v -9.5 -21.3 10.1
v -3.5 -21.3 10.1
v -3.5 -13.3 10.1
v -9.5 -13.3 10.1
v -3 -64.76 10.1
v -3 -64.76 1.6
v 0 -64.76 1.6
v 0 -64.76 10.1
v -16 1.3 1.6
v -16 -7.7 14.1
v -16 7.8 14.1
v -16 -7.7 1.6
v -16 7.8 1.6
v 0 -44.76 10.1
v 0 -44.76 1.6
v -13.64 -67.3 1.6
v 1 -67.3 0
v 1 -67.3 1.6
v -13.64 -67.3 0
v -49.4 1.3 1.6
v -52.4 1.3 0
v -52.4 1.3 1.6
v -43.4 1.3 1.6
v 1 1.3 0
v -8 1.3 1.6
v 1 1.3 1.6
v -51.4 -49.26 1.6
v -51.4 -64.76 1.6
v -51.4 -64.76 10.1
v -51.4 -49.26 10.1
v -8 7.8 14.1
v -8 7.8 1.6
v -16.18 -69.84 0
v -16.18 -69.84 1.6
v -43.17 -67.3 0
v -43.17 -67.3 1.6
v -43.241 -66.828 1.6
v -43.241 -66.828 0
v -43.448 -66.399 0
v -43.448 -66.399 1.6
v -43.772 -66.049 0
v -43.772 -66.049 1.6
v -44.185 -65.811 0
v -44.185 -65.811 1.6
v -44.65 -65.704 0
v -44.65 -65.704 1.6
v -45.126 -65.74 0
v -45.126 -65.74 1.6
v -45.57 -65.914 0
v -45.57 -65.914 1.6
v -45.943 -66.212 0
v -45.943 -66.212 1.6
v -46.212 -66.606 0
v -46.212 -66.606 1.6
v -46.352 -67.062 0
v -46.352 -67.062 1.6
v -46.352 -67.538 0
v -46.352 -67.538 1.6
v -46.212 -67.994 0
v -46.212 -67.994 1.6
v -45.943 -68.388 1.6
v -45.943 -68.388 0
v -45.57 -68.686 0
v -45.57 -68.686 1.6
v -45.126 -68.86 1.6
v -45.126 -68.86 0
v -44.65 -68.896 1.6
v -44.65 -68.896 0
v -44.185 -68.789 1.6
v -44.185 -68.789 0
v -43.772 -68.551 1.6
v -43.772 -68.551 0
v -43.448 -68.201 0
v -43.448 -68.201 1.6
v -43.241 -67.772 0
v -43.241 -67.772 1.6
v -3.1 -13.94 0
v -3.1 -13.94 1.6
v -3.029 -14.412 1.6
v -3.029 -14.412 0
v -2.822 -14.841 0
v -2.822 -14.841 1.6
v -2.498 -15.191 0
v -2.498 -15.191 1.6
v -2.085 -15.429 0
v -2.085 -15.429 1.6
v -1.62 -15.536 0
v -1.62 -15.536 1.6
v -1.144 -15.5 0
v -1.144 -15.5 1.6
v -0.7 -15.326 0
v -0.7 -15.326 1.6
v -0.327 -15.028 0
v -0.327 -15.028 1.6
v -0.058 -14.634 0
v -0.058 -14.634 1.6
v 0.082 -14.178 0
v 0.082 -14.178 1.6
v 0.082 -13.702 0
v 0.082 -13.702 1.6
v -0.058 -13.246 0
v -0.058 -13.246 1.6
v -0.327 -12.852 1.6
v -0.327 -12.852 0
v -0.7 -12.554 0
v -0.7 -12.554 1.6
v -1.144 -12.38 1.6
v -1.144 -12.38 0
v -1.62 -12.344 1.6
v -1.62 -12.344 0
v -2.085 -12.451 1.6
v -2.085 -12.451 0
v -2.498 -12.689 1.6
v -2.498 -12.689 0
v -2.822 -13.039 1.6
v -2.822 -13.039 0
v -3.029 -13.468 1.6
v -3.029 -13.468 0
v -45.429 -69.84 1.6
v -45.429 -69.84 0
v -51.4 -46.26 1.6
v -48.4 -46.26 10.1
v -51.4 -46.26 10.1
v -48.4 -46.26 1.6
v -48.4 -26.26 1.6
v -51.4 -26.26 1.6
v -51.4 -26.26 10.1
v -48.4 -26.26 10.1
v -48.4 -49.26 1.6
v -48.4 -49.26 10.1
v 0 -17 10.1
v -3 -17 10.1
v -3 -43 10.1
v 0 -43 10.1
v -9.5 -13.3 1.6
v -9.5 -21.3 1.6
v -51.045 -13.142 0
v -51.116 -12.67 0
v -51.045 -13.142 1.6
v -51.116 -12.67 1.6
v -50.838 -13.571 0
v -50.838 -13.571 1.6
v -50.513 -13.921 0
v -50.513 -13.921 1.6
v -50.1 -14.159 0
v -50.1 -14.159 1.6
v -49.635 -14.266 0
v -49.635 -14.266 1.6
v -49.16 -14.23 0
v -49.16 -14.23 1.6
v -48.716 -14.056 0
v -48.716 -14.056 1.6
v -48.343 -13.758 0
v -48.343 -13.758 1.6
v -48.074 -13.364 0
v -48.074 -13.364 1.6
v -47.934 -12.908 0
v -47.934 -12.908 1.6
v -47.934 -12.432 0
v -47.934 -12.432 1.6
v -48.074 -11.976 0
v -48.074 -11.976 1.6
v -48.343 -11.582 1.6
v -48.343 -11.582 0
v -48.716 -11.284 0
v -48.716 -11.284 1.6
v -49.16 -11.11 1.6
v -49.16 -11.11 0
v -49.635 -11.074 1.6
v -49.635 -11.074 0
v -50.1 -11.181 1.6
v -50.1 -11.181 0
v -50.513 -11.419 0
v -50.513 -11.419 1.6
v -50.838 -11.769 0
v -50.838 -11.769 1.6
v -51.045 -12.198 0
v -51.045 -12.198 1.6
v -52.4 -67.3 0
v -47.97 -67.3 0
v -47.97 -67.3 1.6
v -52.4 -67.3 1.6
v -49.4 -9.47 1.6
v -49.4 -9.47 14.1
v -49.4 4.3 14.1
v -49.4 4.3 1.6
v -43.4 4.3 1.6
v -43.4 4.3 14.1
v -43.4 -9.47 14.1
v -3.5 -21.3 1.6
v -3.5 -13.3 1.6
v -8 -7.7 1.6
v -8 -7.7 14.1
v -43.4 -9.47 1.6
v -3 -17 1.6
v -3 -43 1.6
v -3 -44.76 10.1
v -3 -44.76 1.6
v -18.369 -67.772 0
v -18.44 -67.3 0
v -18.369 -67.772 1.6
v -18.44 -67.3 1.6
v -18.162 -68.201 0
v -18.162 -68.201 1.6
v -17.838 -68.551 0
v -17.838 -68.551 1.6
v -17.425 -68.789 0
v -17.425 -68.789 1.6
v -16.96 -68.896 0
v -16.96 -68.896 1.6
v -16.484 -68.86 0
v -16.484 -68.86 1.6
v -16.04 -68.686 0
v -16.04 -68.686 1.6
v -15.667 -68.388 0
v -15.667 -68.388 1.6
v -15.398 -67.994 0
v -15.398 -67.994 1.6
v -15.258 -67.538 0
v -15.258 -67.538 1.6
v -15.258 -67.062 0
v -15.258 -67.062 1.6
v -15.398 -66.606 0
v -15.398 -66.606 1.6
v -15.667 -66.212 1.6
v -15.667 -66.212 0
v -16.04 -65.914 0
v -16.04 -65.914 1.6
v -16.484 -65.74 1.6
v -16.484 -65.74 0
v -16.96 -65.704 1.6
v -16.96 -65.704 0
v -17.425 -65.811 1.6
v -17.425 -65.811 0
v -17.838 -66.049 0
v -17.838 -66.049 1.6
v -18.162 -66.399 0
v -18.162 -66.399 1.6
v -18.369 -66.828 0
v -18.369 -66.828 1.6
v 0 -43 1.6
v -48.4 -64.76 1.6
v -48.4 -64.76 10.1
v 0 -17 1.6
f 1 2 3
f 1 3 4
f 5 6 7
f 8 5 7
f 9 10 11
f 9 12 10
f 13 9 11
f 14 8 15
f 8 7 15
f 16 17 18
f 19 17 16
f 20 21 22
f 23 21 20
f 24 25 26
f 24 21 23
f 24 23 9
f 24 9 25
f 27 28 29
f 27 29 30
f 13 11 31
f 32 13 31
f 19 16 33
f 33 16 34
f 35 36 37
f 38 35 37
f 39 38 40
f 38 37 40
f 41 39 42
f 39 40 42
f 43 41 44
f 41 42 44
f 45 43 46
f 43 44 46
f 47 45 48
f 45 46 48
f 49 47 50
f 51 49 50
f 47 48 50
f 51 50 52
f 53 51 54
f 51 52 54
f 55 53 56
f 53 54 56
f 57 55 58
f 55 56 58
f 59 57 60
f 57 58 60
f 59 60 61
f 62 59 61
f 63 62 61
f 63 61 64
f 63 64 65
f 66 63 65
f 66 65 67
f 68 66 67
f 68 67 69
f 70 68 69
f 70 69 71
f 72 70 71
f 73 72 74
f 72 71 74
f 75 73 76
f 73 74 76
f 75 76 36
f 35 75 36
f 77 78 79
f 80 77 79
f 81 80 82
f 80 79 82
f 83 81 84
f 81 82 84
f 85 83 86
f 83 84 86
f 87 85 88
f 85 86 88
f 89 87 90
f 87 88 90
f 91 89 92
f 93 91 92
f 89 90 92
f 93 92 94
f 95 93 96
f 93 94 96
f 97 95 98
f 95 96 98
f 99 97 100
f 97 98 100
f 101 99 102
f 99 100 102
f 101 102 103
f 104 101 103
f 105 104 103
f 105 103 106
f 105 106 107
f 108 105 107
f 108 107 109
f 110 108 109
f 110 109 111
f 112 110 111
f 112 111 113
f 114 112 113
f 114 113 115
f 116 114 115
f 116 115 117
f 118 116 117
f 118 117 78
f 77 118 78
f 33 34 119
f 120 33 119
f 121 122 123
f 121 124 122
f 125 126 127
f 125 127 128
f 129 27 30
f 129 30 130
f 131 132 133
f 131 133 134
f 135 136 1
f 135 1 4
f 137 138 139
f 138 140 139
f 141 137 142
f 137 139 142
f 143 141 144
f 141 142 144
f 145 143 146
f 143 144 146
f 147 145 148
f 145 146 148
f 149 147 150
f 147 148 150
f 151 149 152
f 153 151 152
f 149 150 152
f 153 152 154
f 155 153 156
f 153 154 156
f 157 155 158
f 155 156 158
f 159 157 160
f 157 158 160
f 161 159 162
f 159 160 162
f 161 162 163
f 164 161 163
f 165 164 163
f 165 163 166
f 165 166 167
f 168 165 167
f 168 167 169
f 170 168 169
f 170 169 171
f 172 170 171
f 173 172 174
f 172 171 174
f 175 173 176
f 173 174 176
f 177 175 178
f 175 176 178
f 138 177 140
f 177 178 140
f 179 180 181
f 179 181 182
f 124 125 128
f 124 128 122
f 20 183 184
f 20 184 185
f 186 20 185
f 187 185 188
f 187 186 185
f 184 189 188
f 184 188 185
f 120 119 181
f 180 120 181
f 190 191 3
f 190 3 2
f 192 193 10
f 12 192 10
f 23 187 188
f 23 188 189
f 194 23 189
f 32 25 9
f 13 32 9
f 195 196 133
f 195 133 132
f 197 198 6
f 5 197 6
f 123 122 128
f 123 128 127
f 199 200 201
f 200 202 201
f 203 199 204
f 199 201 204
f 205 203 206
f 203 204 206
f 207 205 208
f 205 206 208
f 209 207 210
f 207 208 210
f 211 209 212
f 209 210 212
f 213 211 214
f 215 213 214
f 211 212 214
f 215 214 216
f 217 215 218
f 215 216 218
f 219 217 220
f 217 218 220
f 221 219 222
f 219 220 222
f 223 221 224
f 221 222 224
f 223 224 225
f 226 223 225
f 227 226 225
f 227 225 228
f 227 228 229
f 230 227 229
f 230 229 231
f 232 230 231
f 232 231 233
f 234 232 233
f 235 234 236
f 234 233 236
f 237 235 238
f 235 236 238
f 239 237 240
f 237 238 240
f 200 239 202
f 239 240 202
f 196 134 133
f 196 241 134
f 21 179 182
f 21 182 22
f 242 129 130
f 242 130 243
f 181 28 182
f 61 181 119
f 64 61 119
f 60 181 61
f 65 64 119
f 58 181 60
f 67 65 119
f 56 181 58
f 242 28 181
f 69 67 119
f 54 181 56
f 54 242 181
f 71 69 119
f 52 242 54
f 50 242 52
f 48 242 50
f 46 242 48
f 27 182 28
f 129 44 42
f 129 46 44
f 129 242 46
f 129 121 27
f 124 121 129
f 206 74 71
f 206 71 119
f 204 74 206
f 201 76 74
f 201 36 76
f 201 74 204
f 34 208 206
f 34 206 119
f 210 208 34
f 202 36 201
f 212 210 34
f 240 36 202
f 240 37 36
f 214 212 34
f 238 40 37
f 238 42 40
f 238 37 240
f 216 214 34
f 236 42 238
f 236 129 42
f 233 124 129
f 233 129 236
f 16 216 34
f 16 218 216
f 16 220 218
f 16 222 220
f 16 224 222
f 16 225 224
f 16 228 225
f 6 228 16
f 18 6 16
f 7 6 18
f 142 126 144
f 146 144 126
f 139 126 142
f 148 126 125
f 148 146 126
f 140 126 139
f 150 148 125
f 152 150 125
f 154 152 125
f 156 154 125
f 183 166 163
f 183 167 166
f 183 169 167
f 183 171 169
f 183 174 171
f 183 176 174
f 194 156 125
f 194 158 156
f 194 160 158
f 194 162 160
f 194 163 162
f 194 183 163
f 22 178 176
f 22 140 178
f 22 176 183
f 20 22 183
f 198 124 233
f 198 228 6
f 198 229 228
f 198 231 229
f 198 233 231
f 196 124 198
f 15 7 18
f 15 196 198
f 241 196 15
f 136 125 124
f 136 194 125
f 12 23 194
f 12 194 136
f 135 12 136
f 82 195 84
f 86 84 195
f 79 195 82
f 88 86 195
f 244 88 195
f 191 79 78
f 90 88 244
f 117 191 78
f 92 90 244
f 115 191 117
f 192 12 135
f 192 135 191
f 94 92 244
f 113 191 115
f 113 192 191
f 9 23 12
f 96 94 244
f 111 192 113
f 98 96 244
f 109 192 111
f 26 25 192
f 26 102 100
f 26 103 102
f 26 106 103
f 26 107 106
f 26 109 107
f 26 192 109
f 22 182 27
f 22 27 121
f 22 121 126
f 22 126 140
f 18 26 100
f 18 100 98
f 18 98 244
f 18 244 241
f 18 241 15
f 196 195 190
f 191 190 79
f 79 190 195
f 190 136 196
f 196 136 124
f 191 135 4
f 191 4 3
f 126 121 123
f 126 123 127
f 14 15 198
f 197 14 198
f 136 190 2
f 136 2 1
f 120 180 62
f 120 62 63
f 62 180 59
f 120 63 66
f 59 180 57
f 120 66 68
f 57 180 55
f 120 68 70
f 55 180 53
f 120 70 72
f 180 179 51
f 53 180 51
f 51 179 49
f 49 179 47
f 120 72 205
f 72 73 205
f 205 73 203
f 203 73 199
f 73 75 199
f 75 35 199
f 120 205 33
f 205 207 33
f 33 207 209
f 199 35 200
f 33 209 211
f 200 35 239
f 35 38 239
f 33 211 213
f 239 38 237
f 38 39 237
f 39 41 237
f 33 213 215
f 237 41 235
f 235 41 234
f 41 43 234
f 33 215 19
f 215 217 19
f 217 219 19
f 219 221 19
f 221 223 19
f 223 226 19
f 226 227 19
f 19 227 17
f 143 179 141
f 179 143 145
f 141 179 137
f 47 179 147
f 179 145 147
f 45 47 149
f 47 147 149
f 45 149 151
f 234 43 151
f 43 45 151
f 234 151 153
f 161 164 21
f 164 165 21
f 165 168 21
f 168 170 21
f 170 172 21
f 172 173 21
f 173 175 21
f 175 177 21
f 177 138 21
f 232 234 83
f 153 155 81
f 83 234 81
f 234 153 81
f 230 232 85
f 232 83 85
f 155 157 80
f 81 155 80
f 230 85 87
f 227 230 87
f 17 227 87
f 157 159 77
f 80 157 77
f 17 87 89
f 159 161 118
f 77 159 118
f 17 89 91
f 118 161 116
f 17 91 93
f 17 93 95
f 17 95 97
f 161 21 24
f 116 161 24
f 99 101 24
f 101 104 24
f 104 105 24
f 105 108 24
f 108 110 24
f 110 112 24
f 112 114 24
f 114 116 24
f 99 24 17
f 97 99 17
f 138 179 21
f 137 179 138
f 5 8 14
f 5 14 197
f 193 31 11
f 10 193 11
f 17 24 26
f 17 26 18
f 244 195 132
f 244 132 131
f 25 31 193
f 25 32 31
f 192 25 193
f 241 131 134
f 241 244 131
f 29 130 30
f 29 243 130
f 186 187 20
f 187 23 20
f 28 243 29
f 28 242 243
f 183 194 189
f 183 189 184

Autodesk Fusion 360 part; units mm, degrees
sketch "Sketch1" plane through (0, 0, 0) normal (0, 0, 1) x (1, 0, 0)
  line L0 (-52.4, 1.3) -> (1, 1.3)
  line L1 (1, 1.3) -> (1, -67.3)
  line L2 (1, -67.3) -> (-52.4, -67.3)
  line L3 (-52.4, -67.3) -> (-52.4, 1.3)
  dimension "d1" = 68.6
  dimension "d2" = 53.4
extrude "Extrude1" add sketch "Sketch1" along normal blind 1.6
sketch "Sketch3" plane through (0, 0, 1.6) normal (0, 0, 1) x (-1, 0, 0)
  line L0 (52.4, 67.3) -> (-1, 67.3)
  line L1 (-1, 67.3) -> (-1, -1.3)
  line L2 (-1, -1.3) -> (52.4, -1.3)
  line L3 (52.4, -1.3) -> (52.4, 67.3)
  line L4 (3, 64.76) -> (0, 64.76)
  line L5 (0, 64.76) -> (0, 44.76)
  line L6 (0, 44.76) -> (3, 44.76)
  line L7 (3, 44.76) -> (3, 64.76)
  dimension "d5" = 20
  dimension "d6" = 2.54
  dimension "d7" = 3
  dimension "d34" = 1
extrude "Extrude2" add sketch "Sketch3" along normal blind 8.5 contours L4 L5 L6 L7
sketch "Sketch4" plane through (0, 0, 1.6) normal (0, 0, 1) x (-1, 0, 0)
  line L0 (3, 44.76) -> (0, 44.76)
  line L1 (0, 44.76) -> (0, 64.76)
  line L2 (0, 64.76) -> (3, 64.76)
  line L3 (3, 64.76) -> (3, 44.76)
  line L4 (52.4, 67.3) -> (-1, 67.3)
  line L5 (-1, 67.3) -> (-1, -1.3)
  line L6 (-1, -1.3) -> (52.4, -1.3)
  line L7 (52.4, -1.3) -> (52.4, 67.3)
  line L8 (51.4, 49.26) -> (48.4, 49.26)
  line L9 (48.4, 49.26) -> (48.4, 64.76)
  line L10 (48.4, 64.76) -> (51.4, 64.76)
  line L11 (51.4, 64.76) -> (51.4, 49.26)
  dimension "d10" = 15.5
  dimension "d11" = 2.54
  dimension "d12" = 3
  dimension "d36" = 1
extrude "Extrude3" add sketch "Sketch4" along normal blind 8.5 contours L8 L9 L10 L11
sketch "Sketch5" plane through (0, 0, 1.6) normal (0, 0, 1) x (-1, 0, 0)
  line L0 (51.4, 64.76) -> (51.4, 49.26)
  line L1 (51.4, 49.26) -> (48.4, 49.26)
  line L2 (48.4, 49.26) -> (48.4, 64.76)
  line L3 (48.4, 64.76) -> (51.4, 64.76)
  line L4 (3, 44.76) -> (0, 44.76)
  line L5 (0, 44.76) -> (0, 64.76)
  line L6 (0, 64.76) -> (3, 64.76)
  line L7 (3, 64.76) -> (3, 44.76)
  line L8 (52.4, 67.3) -> (-1, 67.3)
  line L9 (-1, 67.3) -> (-1, -1.3)
  line L10 (-1, -1.3) -> (52.4, -1.3)
  line L11 (52.4, -1.3) -> (52.4, 67.3)
  line L12 (51.4, 26.26) -> (48.4, 26.26)
  line L13 (48.4, 26.26) -> (48.4, 46.26)
  line L14 (48.4, 46.26) -> (51.4, 46.26)
  line L15 (51.4, 46.26) -> (51.4, 26.26)
  dimension "d15" = 20
  dimension "d16" = 3
  dimension "d17" = 3
  dimension "d35" = 1
extrude "Extrude4" add sketch "Sketch5" along normal blind 8.5 contours L12 L13 L14 L15
sketch "Sketch6" plane through (0, 0, 1.6) normal (0, 0, 1) x (-1, 0, 0)
  line L0 (51.4, 46.26) -> (51.4, 26.26)
  line L1 (51.4, 26.26) -> (48.4, 26.26)
  line L2 (48.4, 26.26) -> (48.4, 46.26)
  line L3 (48.4, 46.26) -> (51.4, 46.26)
  line L4 (51.4, 64.76) -> (51.4, 49.26)
  line L5 (51.4, 49.26) -> (48.4, 49.26)
  line L6 (48.4, 49.26) -> (48.4, 64.76)
  line L7 (48.4, 64.76) -> (51.4, 64.76)
  line L8 (3, 44.76) -> (0, 44.76)
  line L9 (0, 44.76) -> (0, 64.76)
  line L10 (0, 64.76) -> (3, 64.76)
  line L11 (3, 64.76) -> (3, 44.76)
  line L12 (52.4, 67.3) -> (-1, 67.3)
  line L13 (-1, 67.3) -> (-1, -1.3)
  line L14 (-1, -1.3) -> (52.4, -1.3)
  line L15 (52.4, -1.3) -> (52.4, 67.3)
  line L16 (9.5, 13.3) -> (3.5, 13.3)
  line L17 (3.5, 13.3) -> (3.5, 21.3)
  line L18 (3.5, 21.3) -> (9.5, 21.3)
  line L19 (9.5, 21.3) -> (9.5, 13.3)
  dimension "d20" = 8
  dimension "d21" = 6
  dimension "d22" = 46
  dimension "d23" = 0.5
extrude "Extrude5" add sketch "Sketch6" along normal blind 8.5 contours L16 L17 L18 L19
sketch "Sketch7" plane through (0, 0, 1.6) normal (0, 0, 1) x (-1, 0, 0)
  line L0 (9.5, 21.3) -> (9.5, 13.3)
  line L1 (9.5, 13.3) -> (3.5, 13.3)
  line L2 (3.5, 13.3) -> (3.5, 21.3)
  line L3 (3.5, 21.3) -> (9.5, 21.3)
  line L4 (51.4, 46.26) -> (51.4, 26.26)
  line L5 (51.4, 26.26) -> (48.4, 26.26)
  line L6 (48.4, 26.26) -> (48.4, 46.26)
  line L7 (48.4, 46.26) -> (51.4, 46.26)
  line L8 (51.4, 64.76) -> (51.4, 49.26)
  line L9 (51.4, 49.26) -> (48.4, 49.26)
  line L10 (48.4, 49.26) -> (48.4, 64.76)
  line L11 (48.4, 64.76) -> (51.4, 64.76)
  line L12 (3, 44.76) -> (0, 44.76)
  line L13 (0, 44.76) -> (0, 64.76)
  line L14 (0, 64.76) -> (3, 64.76)
  line L15 (3, 64.76) -> (3, 44.76)
  line L16 (52.4, 67.3) -> (-1, 67.3)
  line L17 (-1, 67.3) -> (-1, -1.3)
  line L18 (-1, -1.3) -> (52.4, -1.3)
  line L19 (52.4, -1.3) -> (52.4, 67.3)
  circle A0 centre (1.5, 13.94) radius 1.6
  dimension "d26" = 3.2
  dimension "d27" = 15.24
  dimension "d28" = 2.5
sketch "Sketch8" plane through (0, 0, 10.1) normal (0, 0, 1) x (-1, 0, 0)
  line L0 (3, 44.76) -> (3, 64.76)
  line L1 (3, 64.76) -> (0, 64.76)
  line L2 (0, 64.76) -> (0, 44.76)
  line L3 (0, 44.76) -> (3, 44.76)
sketch "Sketch9" plane through (0, 0, 1.6) normal (0, 0, 1) x (1, 0, 0)
  line L0 (0, -43) -> (-3, -43)
  line L1 (-3, -43) -> (-3, -17)
  line L2 (-3, -17) -> (0, -17)
  line L3 (0, -17) -> (0, -43)
  line L4 (1, -67.3) -> (1, 1.3)
  dimension "d29" = 26
  dimension "d30" = 3
  dimension "d31" = 1
extrude "Extrude6" add sketch "Sketch9" along normal blind 8.5
extrude "Extrude7" cut sketch "Sketch7" against normal blind 50 contours A0
sketch "Sketch10" plane through (0, 0, 1.6) normal (0, 0, 1) x (-1, 0, 0)
  circle A0 centre (1.5, 13.94) radius 1.6
  line L0 (0, 17) -> (0, 43)
  line L1 (0, 43) -> (3, 43)
  line L2 (3, 43) -> (3, 17)
  line L3 (3, 17) -> (0, 17)
  line L4 (9.5, 21.3) -> (9.5, 13.3)
  line L5 (9.5, 13.3) -> (3.5, 13.3)
  line L6 (3.5, 13.3) -> (3.5, 21.3)
  line L7 (3.5, 21.3) -> (9.5, 21.3)
  line L8 (51.4, 46.26) -> (51.4, 26.26)
  line L9 (51.4, 26.26) -> (48.4, 26.26)
  line L10 (48.4, 26.26) -> (48.4, 46.26)
  line L11 (48.4, 46.26) -> (51.4, 46.26)
  line L12 (51.4, 64.76) -> (51.4, 49.26)
  line L13 (51.4, 49.26) -> (48.4, 49.26)
  line L14 (48.4, 49.26) -> (48.4, 64.76)
  line L15 (48.4, 64.76) -> (51.4, 64.76)
  line L16 (3, 44.76) -> (0, 44.76)
  line L17 (0, 44.76) -> (0, 64.76)
  line L18 (0, 64.76) -> (3, 64.76)
  line L19 (3, 64.76) -> (3, 44.76)
  line L20 (52.4, 67.3) -> (-1, 67.3)
  line L21 (-1, 67.3) -> (-1, -1.3)
  line L22 (-1, -1.3) -> (52.4, -1.3)
  line L23 (52.4, -1.3) -> (52.4, 67.3)
  line L24 (49.4, -4.3) -> (43.4, -4.3)
  line L25 (43.4, -4.3) -> (43.4, 9.47)
  line L26 (43.4, 9.47) -> (49.4, 9.47)
  line L27 (49.4, 9.47) -> (49.4, -4.3)
  dimension "d39" = 13.77
  dimension "d40" = 3
  dimension "d41" = 6
  dimension "d44" = 3
extrude "Extrude8" add sketch "Sketch10" along normal blind 12.5 contours L22 L24 L25 L27 | L22 L25 L26 L27
sketch "Sketch11" plane through (0, 0, 1.6) normal (0, 0, 1) x (-1, 0, 0)
  line L0 (49.4, 9.47) -> (49.4, -1.3)
  line L1 (49.4, -1.3) -> (52.4, -1.3)
  line L2 (52.4, -1.3) -> (52.4, 67.3)
  line L3 (52.4, 67.3) -> (-1, 67.3)
  line L4 (-1, 67.3) -> (-1, -1.3)
  line L5 (-1, -1.3) -> (43.4, -1.3)
  line L6 (43.4, -1.3) -> (43.4, 9.47)
  line L7 (43.4, 9.47) -> (49.4, 9.47)
  circle A0 centre (1.5, 13.94) radius 1.6
  line L8 (0, 17) -> (0, 43)
  line L9 (0, 43) -> (3, 43)
  line L10 (3, 43) -> (3, 17)
  line L11 (3, 17) -> (0, 17)
  line L12 (9.5, 21.3) -> (9.5, 13.3)
  line L13 (9.5, 13.3) -> (3.5, 13.3)
  line L14 (3.5, 13.3) -> (3.5, 21.3)
  line L15 (3.5, 21.3) -> (9.5, 21.3)
  line L16 (51.4, 46.26) -> (51.4, 26.26)
  line L17 (51.4, 26.26) -> (48.4, 26.26)
  line L18 (48.4, 26.26) -> (48.4, 46.26)
  line L19 (48.4, 46.26) -> (51.4, 46.26)
  line L20 (51.4, 64.76) -> (51.4, 49.26)
  line L21 (51.4, 49.26) -> (48.4, 49.26)
  line L22 (48.4, 49.26) -> (48.4, 64.76)
  line L23 (48.4, 64.76) -> (51.4, 64.76)
  line L24 (3, 44.76) -> (0, 44.76)
  line L25 (0, 44.76) -> (0, 64.76)
  line L26 (0, 64.76) -> (3, 64.76)
  line L27 (3, 64.76) -> (3, 44.76)
  circle A1 centre (49.5158, 12.67) radius 1.6
  dimension "d45" = 3.2
  dimension "d46" = 13.97
extrude "Extrude9" cut sketch "Sketch11" against normal blind 1.6 contours A1
sketch "Sketch13" plane through (0, 0, 1.6) normal (0, 0, 1) x (-1, 0, 0)
  circle A0 centre (49.5158, 12.67) radius 1.6
  line L0 (49.4, 9.47) -> (49.4, -1.3)
  line L1 (49.4, -1.3) -> (52.4, -1.3)
  line L2 (52.4, -1.3) -> (52.4, 67.3)
  line L3 (52.4, 67.3) -> (-1, 67.3)
  line L4 (-1, 67.3) -> (-1, -1.3)
  line L5 (-1, -1.3) -> (43.4, -1.3)
  line L6 (43.4, -1.3) -> (43.4, 9.47)
  line L7 (43.4, 9.47) -> (49.4, 9.47)
  circle A1 centre (1.5, 13.94) radius 1.6
  line L8 (0, 17) -> (0, 43)
  line L9 (0, 43) -> (3, 43)
  line L10 (3, 43) -> (3, 17)
  line L11 (3, 17) -> (0, 17)
  line L12 (9.5, 21.3) -> (9.5, 13.3)
  line L13 (9.5, 13.3) -> (3.5, 13.3)
  line L14 (3.5, 13.3) -> (3.5, 21.3)
  line L15 (3.5, 21.3) -> (9.5, 21.3)
  line L16 (51.4, 46.26) -> (51.4, 26.26)
  line L17 (51.4, 26.26) -> (48.4, 26.26)
  line L18 (48.4, 26.26) -> (48.4, 46.26)
  line L19 (48.4, 46.26) -> (51.4, 46.26)
  line L20 (51.4, 64.76) -> (51.4, 49.26)
  line L21 (51.4, 49.26) -> (48.4, 49.26)
  line L22 (48.4, 49.26) -> (48.4, 64.76)
  line L23 (48.4, 64.76) -> (51.4, 64.76)
  line L24 (3, 44.76) -> (0, 44.76)
  line L25 (0, 44.76) -> (0, 64.76)
  line L26 (0, 64.76) -> (3, 64.76)
  line L27 (3, 64.76) -> (3, 44.76)
  line L28 (-1, 69.84) -> (52, 69.84)
  line L29 (13.64, 67.3) -> (16.1805, 69.84)
  line L30 (45.429, 69.84) -> (47.97, 67.3)
  dimension "d49" = 2.54
  dimension "d50" = 14.64
  dimension "d51" = 4.43
extrude "Extrude10" add sketch "Sketch13" against normal blind 1.6 contours L3 L28 L29 L30
sketch "Sketch14" plane through (0, 0, 1.6) normal (0, 0, 1) x (-1, 0, 0)
  circle A0 centre (49.5158, 12.67) radius 1.6
  line L0 (49.4, 9.47) -> (49.4, -1.3)
  line L1 (49.4, -1.3) -> (52.4, -1.3)
  line L2 (52.4, -1.3) -> (52.4, 67.3)
  line L3 (52.4, 67.3) -> (47.97, 67.3)
  line L4 (47.97, 67.3) -> (45.429, 69.84)
  line L5 (45.429, 69.84) -> (16.1805, 69.84)
  line L6 (16.1805, 69.84) -> (13.64, 67.3)
  line L7 (13.64, 67.3) -> (-1, 67.3)
  line L8 (-1, 67.3) -> (-1, -1.3)
  line L9 (-1, -1.3) -> (43.4, -1.3)
  line L10 (43.4, -1.3) -> (43.4, 9.47)
  line L11 (43.4, 9.47) -> (49.4, 9.47)
  circle A1 centre (1.5, 13.94) radius 1.6
  line L12 (0, 17) -> (0, 43)
  line L13 (0, 43) -> (3, 43)
  line L14 (3, 43) -> (3, 17)
  line L15 (3, 17) -> (0, 17)
  line L16 (9.5, 21.3) -> (9.5, 13.3)
  line L17 (9.5, 13.3) -> (3.5, 13.3)
  line L18 (3.5, 13.3) -> (3.5, 21.3)
  line L19 (3.5, 21.3) -> (9.5, 21.3)
  line L20 (51.4, 46.26) -> (51.4, 26.26)
  line L21 (51.4, 26.26) -> (48.4, 26.26)
  line L22 (48.4, 26.26) -> (48.4, 46.26)
  line L23 (48.4, 46.26) -> (51.4, 46.26)
  line L24 (51.4, 64.76) -> (51.4, 49.26)
  line L25 (51.4, 49.26) -> (48.4, 49.26)
  line L26 (48.4, 49.26) -> (48.4, 64.76)
  line L27 (48.4, 64.76) -> (51.4, 64.76)
  line L28 (3, 44.76) -> (0, 44.76)
  line L29 (0, 44.76) -> (0, 64.76)
  line L30 (0, 64.76) -> (3, 64.76)
  line L31 (3, 64.76) -> (3, 44.76)
  circle A2 centre (16.84, 67.3) radius 1.6
  dimension "d54" = 3.2
  dimension "d55" = 17.84
  dimension "d56" = 2.54
sketch "Sketch15" plane through (0, 0, 1.6) normal (0, 0, 1) x (1, 0, 0)
  circle A0 centre (-44.77, -67.3) radius 1.6
  line L0 (-45.429, -69.84) -> (-16.1805, -69.84)
  point P0 (-52.4, -67.3)
  dimension "d57" = 3.2
  dimension "d58" = 7.63
  dimension "d59" = 2.54
extrude "Extrude11" cut sketch "Sketch14" against normal blind 1.6 contours A2
extrude "Extrude12" cut sketch "Sketch15" against normal blind 1.6
sketch "Sketch16" plane through (0, 0, 1.6) normal (0, 0, 1) x (-1, 0, 0)
  circle A0 centre (44.77, 67.3) radius 1.6
  circle A1 centre (16.84, 67.3) radius 1.6
  circle A2 centre (49.5158, 12.67) radius 1.6
  line L0 (49.4, 9.47) -> (49.4, -1.3)
  line L1 (49.4, -1.3) -> (52.4, -1.3)
  line L2 (52.4, -1.3) -> (52.4, 67.3)
  line L3 (52.4, 67.3) -> (47.97, 67.3)
  line L4 (47.97, 67.3) -> (45.429, 69.84)
  line L5 (45.429, 69.84) -> (16.1805, 69.84)
  line L6 (16.1805, 69.84) -> (13.64, 67.3)
  line L7 (13.64, 67.3) -> (-1, 67.3)
  line L8 (-1, 67.3) -> (-1, -1.3)
  line L9 (-1, -1.3) -> (43.4, -1.3)
  line L10 (43.4, -1.3) -> (43.4, 9.47)
  line L11 (43.4, 9.47) -> (49.4, 9.47)
  circle A3 centre (1.5, 13.94) radius 1.6
  line L12 (0, 17) -> (0, 43)
  line L13 (0, 43) -> (3, 43)
  line L14 (3, 43) -> (3, 17)
  line L15 (3, 17) -> (0, 17)
  line L16 (9.5, 21.3) -> (9.5, 13.3)
  line L17 (9.5, 13.3) -> (3.5, 13.3)
  line L18 (3.5, 13.3) -> (3.5, 21.3)
  line L19 (3.5, 21.3) -> (9.5, 21.3)
  line L20 (51.4, 46.26) -> (51.4, 26.26)
  line L21 (51.4, 26.26) -> (48.4, 26.26)
  line L22 (48.4, 26.26) -> (48.4, 46.26)
  line L23 (48.4, 46.26) -> (51.4, 46.26)
  line L24 (51.4, 64.76) -> (51.4, 49.26)
  line L25 (51.4, 49.26) -> (48.4, 49.26)
  line L26 (48.4, 49.26) -> (48.4, 64.76)
  line L27 (48.4, 64.76) -> (51.4, 64.76)
  line L28 (3, 44.76) -> (0, 44.76)
  line L29 (0, 44.76) -> (0, 64.76)
  line L30 (0, 64.76) -> (3, 64.76)
  line L31 (3, 64.76) -> (3, 44.76)
  line L32 (8, 7.7) -> (16, 7.7)
  line L33 (16, 7.7) -> (16, -7.8)
  line L34 (16, -7.8) -> (8, -7.8)
  line L35 (8, -7.8) -> (8, 7.7)
  dimension "d64" = 15.5
  dimension "d65" = 9
extrude "Extrude13" add sketch "Sketch16" along normal blind 12.5 contours L9 L33 L34 L35 | L9 L32 L33 L35
sketch "Sketch17" plane through (0, 0, 1.6) normal (0, 0, 1) x (-1, 0, 0)
  line L0 (16, 7.7) -> (16, -1.3)
  line L1 (16, -1.3) -> (43.4, -1.3)
  line L2 (43.4, -1.3) -> (43.4, 9.47)
  line L3 (43.4, 9.47) -> (49.4, 9.47)
  line L4 (49.4, 9.47) -> (49.4, -1.3)
  line L5 (49.4, -1.3) -> (52.4, -1.3)
  line L6 (52.4, -1.3) -> (52.4, 67.3)
  line L7 (52.4, 67.3) -> (47.97, 67.3)
  line L8 (47.97, 67.3) -> (45.429, 69.84)
  line L9 (45.429, 69.84) -> (16.1805, 69.84)
  line L10 (16.1805, 69.84) -> (13.64, 67.3)
  line L11 (13.64, 67.3) -> (-1, 67.3)
  line L12 (-1, 67.3) -> (-1, -1.3)
  line L13 (-1, -1.3) -> (8, -1.3)
  line L14 (8, -1.3) -> (8, 7.7)
  line L15 (8, 7.7) -> (16, 7.7)
  circle A0 centre (44.77, 67.3) radius 1.6
  circle A1 centre (16.84, 67.3) radius 1.6
  circle A2 centre (49.5158, 12.67) radius 1.6
  circle A3 centre (1.5, 13.94) radius 1.6
  line L16 (0, 17) -> (0, 43)
  line L17 (0, 43) -> (3, 43)
  line L18 (3, 43) -> (3, 17)
  line L19 (3, 17) -> (0, 17)
  line L20 (9.5, 21.3) -> (9.5, 13.3)
  line L21 (9.5, 13.3) -> (3.5, 13.3)
  line L22 (3.5, 13.3) -> (3.5, 21.3)
  line L23 (3.5, 21.3) -> (9.5, 21.3)
  line L24 (51.4, 46.26) -> (51.4, 26.26)
  line L25 (51.4, 26.26) -> (48.4, 26.26)
  line L26 (48.4, 26.26) -> (48.4, 46.26)
  line L27 (48.4, 46.26) -> (51.4, 46.26)
  line L28 (51.4, 64.76) -> (51.4, 49.26)
  line L29 (51.4, 49.26) -> (48.4, 49.26)
  line L30 (48.4, 49.26) -> (48.4, 64.76)
  line L31 (48.4, 64.76) -> (51.4, 64.76)
  line L32 (3, 44.76) -> (0, 44.76)
  line L33 (0, 44.76) -> (0, 64.76)
  line L34 (0, 64.76) -> (3, 64.76)
  line L35 (3, 64.76) -> (3, 44.76)
